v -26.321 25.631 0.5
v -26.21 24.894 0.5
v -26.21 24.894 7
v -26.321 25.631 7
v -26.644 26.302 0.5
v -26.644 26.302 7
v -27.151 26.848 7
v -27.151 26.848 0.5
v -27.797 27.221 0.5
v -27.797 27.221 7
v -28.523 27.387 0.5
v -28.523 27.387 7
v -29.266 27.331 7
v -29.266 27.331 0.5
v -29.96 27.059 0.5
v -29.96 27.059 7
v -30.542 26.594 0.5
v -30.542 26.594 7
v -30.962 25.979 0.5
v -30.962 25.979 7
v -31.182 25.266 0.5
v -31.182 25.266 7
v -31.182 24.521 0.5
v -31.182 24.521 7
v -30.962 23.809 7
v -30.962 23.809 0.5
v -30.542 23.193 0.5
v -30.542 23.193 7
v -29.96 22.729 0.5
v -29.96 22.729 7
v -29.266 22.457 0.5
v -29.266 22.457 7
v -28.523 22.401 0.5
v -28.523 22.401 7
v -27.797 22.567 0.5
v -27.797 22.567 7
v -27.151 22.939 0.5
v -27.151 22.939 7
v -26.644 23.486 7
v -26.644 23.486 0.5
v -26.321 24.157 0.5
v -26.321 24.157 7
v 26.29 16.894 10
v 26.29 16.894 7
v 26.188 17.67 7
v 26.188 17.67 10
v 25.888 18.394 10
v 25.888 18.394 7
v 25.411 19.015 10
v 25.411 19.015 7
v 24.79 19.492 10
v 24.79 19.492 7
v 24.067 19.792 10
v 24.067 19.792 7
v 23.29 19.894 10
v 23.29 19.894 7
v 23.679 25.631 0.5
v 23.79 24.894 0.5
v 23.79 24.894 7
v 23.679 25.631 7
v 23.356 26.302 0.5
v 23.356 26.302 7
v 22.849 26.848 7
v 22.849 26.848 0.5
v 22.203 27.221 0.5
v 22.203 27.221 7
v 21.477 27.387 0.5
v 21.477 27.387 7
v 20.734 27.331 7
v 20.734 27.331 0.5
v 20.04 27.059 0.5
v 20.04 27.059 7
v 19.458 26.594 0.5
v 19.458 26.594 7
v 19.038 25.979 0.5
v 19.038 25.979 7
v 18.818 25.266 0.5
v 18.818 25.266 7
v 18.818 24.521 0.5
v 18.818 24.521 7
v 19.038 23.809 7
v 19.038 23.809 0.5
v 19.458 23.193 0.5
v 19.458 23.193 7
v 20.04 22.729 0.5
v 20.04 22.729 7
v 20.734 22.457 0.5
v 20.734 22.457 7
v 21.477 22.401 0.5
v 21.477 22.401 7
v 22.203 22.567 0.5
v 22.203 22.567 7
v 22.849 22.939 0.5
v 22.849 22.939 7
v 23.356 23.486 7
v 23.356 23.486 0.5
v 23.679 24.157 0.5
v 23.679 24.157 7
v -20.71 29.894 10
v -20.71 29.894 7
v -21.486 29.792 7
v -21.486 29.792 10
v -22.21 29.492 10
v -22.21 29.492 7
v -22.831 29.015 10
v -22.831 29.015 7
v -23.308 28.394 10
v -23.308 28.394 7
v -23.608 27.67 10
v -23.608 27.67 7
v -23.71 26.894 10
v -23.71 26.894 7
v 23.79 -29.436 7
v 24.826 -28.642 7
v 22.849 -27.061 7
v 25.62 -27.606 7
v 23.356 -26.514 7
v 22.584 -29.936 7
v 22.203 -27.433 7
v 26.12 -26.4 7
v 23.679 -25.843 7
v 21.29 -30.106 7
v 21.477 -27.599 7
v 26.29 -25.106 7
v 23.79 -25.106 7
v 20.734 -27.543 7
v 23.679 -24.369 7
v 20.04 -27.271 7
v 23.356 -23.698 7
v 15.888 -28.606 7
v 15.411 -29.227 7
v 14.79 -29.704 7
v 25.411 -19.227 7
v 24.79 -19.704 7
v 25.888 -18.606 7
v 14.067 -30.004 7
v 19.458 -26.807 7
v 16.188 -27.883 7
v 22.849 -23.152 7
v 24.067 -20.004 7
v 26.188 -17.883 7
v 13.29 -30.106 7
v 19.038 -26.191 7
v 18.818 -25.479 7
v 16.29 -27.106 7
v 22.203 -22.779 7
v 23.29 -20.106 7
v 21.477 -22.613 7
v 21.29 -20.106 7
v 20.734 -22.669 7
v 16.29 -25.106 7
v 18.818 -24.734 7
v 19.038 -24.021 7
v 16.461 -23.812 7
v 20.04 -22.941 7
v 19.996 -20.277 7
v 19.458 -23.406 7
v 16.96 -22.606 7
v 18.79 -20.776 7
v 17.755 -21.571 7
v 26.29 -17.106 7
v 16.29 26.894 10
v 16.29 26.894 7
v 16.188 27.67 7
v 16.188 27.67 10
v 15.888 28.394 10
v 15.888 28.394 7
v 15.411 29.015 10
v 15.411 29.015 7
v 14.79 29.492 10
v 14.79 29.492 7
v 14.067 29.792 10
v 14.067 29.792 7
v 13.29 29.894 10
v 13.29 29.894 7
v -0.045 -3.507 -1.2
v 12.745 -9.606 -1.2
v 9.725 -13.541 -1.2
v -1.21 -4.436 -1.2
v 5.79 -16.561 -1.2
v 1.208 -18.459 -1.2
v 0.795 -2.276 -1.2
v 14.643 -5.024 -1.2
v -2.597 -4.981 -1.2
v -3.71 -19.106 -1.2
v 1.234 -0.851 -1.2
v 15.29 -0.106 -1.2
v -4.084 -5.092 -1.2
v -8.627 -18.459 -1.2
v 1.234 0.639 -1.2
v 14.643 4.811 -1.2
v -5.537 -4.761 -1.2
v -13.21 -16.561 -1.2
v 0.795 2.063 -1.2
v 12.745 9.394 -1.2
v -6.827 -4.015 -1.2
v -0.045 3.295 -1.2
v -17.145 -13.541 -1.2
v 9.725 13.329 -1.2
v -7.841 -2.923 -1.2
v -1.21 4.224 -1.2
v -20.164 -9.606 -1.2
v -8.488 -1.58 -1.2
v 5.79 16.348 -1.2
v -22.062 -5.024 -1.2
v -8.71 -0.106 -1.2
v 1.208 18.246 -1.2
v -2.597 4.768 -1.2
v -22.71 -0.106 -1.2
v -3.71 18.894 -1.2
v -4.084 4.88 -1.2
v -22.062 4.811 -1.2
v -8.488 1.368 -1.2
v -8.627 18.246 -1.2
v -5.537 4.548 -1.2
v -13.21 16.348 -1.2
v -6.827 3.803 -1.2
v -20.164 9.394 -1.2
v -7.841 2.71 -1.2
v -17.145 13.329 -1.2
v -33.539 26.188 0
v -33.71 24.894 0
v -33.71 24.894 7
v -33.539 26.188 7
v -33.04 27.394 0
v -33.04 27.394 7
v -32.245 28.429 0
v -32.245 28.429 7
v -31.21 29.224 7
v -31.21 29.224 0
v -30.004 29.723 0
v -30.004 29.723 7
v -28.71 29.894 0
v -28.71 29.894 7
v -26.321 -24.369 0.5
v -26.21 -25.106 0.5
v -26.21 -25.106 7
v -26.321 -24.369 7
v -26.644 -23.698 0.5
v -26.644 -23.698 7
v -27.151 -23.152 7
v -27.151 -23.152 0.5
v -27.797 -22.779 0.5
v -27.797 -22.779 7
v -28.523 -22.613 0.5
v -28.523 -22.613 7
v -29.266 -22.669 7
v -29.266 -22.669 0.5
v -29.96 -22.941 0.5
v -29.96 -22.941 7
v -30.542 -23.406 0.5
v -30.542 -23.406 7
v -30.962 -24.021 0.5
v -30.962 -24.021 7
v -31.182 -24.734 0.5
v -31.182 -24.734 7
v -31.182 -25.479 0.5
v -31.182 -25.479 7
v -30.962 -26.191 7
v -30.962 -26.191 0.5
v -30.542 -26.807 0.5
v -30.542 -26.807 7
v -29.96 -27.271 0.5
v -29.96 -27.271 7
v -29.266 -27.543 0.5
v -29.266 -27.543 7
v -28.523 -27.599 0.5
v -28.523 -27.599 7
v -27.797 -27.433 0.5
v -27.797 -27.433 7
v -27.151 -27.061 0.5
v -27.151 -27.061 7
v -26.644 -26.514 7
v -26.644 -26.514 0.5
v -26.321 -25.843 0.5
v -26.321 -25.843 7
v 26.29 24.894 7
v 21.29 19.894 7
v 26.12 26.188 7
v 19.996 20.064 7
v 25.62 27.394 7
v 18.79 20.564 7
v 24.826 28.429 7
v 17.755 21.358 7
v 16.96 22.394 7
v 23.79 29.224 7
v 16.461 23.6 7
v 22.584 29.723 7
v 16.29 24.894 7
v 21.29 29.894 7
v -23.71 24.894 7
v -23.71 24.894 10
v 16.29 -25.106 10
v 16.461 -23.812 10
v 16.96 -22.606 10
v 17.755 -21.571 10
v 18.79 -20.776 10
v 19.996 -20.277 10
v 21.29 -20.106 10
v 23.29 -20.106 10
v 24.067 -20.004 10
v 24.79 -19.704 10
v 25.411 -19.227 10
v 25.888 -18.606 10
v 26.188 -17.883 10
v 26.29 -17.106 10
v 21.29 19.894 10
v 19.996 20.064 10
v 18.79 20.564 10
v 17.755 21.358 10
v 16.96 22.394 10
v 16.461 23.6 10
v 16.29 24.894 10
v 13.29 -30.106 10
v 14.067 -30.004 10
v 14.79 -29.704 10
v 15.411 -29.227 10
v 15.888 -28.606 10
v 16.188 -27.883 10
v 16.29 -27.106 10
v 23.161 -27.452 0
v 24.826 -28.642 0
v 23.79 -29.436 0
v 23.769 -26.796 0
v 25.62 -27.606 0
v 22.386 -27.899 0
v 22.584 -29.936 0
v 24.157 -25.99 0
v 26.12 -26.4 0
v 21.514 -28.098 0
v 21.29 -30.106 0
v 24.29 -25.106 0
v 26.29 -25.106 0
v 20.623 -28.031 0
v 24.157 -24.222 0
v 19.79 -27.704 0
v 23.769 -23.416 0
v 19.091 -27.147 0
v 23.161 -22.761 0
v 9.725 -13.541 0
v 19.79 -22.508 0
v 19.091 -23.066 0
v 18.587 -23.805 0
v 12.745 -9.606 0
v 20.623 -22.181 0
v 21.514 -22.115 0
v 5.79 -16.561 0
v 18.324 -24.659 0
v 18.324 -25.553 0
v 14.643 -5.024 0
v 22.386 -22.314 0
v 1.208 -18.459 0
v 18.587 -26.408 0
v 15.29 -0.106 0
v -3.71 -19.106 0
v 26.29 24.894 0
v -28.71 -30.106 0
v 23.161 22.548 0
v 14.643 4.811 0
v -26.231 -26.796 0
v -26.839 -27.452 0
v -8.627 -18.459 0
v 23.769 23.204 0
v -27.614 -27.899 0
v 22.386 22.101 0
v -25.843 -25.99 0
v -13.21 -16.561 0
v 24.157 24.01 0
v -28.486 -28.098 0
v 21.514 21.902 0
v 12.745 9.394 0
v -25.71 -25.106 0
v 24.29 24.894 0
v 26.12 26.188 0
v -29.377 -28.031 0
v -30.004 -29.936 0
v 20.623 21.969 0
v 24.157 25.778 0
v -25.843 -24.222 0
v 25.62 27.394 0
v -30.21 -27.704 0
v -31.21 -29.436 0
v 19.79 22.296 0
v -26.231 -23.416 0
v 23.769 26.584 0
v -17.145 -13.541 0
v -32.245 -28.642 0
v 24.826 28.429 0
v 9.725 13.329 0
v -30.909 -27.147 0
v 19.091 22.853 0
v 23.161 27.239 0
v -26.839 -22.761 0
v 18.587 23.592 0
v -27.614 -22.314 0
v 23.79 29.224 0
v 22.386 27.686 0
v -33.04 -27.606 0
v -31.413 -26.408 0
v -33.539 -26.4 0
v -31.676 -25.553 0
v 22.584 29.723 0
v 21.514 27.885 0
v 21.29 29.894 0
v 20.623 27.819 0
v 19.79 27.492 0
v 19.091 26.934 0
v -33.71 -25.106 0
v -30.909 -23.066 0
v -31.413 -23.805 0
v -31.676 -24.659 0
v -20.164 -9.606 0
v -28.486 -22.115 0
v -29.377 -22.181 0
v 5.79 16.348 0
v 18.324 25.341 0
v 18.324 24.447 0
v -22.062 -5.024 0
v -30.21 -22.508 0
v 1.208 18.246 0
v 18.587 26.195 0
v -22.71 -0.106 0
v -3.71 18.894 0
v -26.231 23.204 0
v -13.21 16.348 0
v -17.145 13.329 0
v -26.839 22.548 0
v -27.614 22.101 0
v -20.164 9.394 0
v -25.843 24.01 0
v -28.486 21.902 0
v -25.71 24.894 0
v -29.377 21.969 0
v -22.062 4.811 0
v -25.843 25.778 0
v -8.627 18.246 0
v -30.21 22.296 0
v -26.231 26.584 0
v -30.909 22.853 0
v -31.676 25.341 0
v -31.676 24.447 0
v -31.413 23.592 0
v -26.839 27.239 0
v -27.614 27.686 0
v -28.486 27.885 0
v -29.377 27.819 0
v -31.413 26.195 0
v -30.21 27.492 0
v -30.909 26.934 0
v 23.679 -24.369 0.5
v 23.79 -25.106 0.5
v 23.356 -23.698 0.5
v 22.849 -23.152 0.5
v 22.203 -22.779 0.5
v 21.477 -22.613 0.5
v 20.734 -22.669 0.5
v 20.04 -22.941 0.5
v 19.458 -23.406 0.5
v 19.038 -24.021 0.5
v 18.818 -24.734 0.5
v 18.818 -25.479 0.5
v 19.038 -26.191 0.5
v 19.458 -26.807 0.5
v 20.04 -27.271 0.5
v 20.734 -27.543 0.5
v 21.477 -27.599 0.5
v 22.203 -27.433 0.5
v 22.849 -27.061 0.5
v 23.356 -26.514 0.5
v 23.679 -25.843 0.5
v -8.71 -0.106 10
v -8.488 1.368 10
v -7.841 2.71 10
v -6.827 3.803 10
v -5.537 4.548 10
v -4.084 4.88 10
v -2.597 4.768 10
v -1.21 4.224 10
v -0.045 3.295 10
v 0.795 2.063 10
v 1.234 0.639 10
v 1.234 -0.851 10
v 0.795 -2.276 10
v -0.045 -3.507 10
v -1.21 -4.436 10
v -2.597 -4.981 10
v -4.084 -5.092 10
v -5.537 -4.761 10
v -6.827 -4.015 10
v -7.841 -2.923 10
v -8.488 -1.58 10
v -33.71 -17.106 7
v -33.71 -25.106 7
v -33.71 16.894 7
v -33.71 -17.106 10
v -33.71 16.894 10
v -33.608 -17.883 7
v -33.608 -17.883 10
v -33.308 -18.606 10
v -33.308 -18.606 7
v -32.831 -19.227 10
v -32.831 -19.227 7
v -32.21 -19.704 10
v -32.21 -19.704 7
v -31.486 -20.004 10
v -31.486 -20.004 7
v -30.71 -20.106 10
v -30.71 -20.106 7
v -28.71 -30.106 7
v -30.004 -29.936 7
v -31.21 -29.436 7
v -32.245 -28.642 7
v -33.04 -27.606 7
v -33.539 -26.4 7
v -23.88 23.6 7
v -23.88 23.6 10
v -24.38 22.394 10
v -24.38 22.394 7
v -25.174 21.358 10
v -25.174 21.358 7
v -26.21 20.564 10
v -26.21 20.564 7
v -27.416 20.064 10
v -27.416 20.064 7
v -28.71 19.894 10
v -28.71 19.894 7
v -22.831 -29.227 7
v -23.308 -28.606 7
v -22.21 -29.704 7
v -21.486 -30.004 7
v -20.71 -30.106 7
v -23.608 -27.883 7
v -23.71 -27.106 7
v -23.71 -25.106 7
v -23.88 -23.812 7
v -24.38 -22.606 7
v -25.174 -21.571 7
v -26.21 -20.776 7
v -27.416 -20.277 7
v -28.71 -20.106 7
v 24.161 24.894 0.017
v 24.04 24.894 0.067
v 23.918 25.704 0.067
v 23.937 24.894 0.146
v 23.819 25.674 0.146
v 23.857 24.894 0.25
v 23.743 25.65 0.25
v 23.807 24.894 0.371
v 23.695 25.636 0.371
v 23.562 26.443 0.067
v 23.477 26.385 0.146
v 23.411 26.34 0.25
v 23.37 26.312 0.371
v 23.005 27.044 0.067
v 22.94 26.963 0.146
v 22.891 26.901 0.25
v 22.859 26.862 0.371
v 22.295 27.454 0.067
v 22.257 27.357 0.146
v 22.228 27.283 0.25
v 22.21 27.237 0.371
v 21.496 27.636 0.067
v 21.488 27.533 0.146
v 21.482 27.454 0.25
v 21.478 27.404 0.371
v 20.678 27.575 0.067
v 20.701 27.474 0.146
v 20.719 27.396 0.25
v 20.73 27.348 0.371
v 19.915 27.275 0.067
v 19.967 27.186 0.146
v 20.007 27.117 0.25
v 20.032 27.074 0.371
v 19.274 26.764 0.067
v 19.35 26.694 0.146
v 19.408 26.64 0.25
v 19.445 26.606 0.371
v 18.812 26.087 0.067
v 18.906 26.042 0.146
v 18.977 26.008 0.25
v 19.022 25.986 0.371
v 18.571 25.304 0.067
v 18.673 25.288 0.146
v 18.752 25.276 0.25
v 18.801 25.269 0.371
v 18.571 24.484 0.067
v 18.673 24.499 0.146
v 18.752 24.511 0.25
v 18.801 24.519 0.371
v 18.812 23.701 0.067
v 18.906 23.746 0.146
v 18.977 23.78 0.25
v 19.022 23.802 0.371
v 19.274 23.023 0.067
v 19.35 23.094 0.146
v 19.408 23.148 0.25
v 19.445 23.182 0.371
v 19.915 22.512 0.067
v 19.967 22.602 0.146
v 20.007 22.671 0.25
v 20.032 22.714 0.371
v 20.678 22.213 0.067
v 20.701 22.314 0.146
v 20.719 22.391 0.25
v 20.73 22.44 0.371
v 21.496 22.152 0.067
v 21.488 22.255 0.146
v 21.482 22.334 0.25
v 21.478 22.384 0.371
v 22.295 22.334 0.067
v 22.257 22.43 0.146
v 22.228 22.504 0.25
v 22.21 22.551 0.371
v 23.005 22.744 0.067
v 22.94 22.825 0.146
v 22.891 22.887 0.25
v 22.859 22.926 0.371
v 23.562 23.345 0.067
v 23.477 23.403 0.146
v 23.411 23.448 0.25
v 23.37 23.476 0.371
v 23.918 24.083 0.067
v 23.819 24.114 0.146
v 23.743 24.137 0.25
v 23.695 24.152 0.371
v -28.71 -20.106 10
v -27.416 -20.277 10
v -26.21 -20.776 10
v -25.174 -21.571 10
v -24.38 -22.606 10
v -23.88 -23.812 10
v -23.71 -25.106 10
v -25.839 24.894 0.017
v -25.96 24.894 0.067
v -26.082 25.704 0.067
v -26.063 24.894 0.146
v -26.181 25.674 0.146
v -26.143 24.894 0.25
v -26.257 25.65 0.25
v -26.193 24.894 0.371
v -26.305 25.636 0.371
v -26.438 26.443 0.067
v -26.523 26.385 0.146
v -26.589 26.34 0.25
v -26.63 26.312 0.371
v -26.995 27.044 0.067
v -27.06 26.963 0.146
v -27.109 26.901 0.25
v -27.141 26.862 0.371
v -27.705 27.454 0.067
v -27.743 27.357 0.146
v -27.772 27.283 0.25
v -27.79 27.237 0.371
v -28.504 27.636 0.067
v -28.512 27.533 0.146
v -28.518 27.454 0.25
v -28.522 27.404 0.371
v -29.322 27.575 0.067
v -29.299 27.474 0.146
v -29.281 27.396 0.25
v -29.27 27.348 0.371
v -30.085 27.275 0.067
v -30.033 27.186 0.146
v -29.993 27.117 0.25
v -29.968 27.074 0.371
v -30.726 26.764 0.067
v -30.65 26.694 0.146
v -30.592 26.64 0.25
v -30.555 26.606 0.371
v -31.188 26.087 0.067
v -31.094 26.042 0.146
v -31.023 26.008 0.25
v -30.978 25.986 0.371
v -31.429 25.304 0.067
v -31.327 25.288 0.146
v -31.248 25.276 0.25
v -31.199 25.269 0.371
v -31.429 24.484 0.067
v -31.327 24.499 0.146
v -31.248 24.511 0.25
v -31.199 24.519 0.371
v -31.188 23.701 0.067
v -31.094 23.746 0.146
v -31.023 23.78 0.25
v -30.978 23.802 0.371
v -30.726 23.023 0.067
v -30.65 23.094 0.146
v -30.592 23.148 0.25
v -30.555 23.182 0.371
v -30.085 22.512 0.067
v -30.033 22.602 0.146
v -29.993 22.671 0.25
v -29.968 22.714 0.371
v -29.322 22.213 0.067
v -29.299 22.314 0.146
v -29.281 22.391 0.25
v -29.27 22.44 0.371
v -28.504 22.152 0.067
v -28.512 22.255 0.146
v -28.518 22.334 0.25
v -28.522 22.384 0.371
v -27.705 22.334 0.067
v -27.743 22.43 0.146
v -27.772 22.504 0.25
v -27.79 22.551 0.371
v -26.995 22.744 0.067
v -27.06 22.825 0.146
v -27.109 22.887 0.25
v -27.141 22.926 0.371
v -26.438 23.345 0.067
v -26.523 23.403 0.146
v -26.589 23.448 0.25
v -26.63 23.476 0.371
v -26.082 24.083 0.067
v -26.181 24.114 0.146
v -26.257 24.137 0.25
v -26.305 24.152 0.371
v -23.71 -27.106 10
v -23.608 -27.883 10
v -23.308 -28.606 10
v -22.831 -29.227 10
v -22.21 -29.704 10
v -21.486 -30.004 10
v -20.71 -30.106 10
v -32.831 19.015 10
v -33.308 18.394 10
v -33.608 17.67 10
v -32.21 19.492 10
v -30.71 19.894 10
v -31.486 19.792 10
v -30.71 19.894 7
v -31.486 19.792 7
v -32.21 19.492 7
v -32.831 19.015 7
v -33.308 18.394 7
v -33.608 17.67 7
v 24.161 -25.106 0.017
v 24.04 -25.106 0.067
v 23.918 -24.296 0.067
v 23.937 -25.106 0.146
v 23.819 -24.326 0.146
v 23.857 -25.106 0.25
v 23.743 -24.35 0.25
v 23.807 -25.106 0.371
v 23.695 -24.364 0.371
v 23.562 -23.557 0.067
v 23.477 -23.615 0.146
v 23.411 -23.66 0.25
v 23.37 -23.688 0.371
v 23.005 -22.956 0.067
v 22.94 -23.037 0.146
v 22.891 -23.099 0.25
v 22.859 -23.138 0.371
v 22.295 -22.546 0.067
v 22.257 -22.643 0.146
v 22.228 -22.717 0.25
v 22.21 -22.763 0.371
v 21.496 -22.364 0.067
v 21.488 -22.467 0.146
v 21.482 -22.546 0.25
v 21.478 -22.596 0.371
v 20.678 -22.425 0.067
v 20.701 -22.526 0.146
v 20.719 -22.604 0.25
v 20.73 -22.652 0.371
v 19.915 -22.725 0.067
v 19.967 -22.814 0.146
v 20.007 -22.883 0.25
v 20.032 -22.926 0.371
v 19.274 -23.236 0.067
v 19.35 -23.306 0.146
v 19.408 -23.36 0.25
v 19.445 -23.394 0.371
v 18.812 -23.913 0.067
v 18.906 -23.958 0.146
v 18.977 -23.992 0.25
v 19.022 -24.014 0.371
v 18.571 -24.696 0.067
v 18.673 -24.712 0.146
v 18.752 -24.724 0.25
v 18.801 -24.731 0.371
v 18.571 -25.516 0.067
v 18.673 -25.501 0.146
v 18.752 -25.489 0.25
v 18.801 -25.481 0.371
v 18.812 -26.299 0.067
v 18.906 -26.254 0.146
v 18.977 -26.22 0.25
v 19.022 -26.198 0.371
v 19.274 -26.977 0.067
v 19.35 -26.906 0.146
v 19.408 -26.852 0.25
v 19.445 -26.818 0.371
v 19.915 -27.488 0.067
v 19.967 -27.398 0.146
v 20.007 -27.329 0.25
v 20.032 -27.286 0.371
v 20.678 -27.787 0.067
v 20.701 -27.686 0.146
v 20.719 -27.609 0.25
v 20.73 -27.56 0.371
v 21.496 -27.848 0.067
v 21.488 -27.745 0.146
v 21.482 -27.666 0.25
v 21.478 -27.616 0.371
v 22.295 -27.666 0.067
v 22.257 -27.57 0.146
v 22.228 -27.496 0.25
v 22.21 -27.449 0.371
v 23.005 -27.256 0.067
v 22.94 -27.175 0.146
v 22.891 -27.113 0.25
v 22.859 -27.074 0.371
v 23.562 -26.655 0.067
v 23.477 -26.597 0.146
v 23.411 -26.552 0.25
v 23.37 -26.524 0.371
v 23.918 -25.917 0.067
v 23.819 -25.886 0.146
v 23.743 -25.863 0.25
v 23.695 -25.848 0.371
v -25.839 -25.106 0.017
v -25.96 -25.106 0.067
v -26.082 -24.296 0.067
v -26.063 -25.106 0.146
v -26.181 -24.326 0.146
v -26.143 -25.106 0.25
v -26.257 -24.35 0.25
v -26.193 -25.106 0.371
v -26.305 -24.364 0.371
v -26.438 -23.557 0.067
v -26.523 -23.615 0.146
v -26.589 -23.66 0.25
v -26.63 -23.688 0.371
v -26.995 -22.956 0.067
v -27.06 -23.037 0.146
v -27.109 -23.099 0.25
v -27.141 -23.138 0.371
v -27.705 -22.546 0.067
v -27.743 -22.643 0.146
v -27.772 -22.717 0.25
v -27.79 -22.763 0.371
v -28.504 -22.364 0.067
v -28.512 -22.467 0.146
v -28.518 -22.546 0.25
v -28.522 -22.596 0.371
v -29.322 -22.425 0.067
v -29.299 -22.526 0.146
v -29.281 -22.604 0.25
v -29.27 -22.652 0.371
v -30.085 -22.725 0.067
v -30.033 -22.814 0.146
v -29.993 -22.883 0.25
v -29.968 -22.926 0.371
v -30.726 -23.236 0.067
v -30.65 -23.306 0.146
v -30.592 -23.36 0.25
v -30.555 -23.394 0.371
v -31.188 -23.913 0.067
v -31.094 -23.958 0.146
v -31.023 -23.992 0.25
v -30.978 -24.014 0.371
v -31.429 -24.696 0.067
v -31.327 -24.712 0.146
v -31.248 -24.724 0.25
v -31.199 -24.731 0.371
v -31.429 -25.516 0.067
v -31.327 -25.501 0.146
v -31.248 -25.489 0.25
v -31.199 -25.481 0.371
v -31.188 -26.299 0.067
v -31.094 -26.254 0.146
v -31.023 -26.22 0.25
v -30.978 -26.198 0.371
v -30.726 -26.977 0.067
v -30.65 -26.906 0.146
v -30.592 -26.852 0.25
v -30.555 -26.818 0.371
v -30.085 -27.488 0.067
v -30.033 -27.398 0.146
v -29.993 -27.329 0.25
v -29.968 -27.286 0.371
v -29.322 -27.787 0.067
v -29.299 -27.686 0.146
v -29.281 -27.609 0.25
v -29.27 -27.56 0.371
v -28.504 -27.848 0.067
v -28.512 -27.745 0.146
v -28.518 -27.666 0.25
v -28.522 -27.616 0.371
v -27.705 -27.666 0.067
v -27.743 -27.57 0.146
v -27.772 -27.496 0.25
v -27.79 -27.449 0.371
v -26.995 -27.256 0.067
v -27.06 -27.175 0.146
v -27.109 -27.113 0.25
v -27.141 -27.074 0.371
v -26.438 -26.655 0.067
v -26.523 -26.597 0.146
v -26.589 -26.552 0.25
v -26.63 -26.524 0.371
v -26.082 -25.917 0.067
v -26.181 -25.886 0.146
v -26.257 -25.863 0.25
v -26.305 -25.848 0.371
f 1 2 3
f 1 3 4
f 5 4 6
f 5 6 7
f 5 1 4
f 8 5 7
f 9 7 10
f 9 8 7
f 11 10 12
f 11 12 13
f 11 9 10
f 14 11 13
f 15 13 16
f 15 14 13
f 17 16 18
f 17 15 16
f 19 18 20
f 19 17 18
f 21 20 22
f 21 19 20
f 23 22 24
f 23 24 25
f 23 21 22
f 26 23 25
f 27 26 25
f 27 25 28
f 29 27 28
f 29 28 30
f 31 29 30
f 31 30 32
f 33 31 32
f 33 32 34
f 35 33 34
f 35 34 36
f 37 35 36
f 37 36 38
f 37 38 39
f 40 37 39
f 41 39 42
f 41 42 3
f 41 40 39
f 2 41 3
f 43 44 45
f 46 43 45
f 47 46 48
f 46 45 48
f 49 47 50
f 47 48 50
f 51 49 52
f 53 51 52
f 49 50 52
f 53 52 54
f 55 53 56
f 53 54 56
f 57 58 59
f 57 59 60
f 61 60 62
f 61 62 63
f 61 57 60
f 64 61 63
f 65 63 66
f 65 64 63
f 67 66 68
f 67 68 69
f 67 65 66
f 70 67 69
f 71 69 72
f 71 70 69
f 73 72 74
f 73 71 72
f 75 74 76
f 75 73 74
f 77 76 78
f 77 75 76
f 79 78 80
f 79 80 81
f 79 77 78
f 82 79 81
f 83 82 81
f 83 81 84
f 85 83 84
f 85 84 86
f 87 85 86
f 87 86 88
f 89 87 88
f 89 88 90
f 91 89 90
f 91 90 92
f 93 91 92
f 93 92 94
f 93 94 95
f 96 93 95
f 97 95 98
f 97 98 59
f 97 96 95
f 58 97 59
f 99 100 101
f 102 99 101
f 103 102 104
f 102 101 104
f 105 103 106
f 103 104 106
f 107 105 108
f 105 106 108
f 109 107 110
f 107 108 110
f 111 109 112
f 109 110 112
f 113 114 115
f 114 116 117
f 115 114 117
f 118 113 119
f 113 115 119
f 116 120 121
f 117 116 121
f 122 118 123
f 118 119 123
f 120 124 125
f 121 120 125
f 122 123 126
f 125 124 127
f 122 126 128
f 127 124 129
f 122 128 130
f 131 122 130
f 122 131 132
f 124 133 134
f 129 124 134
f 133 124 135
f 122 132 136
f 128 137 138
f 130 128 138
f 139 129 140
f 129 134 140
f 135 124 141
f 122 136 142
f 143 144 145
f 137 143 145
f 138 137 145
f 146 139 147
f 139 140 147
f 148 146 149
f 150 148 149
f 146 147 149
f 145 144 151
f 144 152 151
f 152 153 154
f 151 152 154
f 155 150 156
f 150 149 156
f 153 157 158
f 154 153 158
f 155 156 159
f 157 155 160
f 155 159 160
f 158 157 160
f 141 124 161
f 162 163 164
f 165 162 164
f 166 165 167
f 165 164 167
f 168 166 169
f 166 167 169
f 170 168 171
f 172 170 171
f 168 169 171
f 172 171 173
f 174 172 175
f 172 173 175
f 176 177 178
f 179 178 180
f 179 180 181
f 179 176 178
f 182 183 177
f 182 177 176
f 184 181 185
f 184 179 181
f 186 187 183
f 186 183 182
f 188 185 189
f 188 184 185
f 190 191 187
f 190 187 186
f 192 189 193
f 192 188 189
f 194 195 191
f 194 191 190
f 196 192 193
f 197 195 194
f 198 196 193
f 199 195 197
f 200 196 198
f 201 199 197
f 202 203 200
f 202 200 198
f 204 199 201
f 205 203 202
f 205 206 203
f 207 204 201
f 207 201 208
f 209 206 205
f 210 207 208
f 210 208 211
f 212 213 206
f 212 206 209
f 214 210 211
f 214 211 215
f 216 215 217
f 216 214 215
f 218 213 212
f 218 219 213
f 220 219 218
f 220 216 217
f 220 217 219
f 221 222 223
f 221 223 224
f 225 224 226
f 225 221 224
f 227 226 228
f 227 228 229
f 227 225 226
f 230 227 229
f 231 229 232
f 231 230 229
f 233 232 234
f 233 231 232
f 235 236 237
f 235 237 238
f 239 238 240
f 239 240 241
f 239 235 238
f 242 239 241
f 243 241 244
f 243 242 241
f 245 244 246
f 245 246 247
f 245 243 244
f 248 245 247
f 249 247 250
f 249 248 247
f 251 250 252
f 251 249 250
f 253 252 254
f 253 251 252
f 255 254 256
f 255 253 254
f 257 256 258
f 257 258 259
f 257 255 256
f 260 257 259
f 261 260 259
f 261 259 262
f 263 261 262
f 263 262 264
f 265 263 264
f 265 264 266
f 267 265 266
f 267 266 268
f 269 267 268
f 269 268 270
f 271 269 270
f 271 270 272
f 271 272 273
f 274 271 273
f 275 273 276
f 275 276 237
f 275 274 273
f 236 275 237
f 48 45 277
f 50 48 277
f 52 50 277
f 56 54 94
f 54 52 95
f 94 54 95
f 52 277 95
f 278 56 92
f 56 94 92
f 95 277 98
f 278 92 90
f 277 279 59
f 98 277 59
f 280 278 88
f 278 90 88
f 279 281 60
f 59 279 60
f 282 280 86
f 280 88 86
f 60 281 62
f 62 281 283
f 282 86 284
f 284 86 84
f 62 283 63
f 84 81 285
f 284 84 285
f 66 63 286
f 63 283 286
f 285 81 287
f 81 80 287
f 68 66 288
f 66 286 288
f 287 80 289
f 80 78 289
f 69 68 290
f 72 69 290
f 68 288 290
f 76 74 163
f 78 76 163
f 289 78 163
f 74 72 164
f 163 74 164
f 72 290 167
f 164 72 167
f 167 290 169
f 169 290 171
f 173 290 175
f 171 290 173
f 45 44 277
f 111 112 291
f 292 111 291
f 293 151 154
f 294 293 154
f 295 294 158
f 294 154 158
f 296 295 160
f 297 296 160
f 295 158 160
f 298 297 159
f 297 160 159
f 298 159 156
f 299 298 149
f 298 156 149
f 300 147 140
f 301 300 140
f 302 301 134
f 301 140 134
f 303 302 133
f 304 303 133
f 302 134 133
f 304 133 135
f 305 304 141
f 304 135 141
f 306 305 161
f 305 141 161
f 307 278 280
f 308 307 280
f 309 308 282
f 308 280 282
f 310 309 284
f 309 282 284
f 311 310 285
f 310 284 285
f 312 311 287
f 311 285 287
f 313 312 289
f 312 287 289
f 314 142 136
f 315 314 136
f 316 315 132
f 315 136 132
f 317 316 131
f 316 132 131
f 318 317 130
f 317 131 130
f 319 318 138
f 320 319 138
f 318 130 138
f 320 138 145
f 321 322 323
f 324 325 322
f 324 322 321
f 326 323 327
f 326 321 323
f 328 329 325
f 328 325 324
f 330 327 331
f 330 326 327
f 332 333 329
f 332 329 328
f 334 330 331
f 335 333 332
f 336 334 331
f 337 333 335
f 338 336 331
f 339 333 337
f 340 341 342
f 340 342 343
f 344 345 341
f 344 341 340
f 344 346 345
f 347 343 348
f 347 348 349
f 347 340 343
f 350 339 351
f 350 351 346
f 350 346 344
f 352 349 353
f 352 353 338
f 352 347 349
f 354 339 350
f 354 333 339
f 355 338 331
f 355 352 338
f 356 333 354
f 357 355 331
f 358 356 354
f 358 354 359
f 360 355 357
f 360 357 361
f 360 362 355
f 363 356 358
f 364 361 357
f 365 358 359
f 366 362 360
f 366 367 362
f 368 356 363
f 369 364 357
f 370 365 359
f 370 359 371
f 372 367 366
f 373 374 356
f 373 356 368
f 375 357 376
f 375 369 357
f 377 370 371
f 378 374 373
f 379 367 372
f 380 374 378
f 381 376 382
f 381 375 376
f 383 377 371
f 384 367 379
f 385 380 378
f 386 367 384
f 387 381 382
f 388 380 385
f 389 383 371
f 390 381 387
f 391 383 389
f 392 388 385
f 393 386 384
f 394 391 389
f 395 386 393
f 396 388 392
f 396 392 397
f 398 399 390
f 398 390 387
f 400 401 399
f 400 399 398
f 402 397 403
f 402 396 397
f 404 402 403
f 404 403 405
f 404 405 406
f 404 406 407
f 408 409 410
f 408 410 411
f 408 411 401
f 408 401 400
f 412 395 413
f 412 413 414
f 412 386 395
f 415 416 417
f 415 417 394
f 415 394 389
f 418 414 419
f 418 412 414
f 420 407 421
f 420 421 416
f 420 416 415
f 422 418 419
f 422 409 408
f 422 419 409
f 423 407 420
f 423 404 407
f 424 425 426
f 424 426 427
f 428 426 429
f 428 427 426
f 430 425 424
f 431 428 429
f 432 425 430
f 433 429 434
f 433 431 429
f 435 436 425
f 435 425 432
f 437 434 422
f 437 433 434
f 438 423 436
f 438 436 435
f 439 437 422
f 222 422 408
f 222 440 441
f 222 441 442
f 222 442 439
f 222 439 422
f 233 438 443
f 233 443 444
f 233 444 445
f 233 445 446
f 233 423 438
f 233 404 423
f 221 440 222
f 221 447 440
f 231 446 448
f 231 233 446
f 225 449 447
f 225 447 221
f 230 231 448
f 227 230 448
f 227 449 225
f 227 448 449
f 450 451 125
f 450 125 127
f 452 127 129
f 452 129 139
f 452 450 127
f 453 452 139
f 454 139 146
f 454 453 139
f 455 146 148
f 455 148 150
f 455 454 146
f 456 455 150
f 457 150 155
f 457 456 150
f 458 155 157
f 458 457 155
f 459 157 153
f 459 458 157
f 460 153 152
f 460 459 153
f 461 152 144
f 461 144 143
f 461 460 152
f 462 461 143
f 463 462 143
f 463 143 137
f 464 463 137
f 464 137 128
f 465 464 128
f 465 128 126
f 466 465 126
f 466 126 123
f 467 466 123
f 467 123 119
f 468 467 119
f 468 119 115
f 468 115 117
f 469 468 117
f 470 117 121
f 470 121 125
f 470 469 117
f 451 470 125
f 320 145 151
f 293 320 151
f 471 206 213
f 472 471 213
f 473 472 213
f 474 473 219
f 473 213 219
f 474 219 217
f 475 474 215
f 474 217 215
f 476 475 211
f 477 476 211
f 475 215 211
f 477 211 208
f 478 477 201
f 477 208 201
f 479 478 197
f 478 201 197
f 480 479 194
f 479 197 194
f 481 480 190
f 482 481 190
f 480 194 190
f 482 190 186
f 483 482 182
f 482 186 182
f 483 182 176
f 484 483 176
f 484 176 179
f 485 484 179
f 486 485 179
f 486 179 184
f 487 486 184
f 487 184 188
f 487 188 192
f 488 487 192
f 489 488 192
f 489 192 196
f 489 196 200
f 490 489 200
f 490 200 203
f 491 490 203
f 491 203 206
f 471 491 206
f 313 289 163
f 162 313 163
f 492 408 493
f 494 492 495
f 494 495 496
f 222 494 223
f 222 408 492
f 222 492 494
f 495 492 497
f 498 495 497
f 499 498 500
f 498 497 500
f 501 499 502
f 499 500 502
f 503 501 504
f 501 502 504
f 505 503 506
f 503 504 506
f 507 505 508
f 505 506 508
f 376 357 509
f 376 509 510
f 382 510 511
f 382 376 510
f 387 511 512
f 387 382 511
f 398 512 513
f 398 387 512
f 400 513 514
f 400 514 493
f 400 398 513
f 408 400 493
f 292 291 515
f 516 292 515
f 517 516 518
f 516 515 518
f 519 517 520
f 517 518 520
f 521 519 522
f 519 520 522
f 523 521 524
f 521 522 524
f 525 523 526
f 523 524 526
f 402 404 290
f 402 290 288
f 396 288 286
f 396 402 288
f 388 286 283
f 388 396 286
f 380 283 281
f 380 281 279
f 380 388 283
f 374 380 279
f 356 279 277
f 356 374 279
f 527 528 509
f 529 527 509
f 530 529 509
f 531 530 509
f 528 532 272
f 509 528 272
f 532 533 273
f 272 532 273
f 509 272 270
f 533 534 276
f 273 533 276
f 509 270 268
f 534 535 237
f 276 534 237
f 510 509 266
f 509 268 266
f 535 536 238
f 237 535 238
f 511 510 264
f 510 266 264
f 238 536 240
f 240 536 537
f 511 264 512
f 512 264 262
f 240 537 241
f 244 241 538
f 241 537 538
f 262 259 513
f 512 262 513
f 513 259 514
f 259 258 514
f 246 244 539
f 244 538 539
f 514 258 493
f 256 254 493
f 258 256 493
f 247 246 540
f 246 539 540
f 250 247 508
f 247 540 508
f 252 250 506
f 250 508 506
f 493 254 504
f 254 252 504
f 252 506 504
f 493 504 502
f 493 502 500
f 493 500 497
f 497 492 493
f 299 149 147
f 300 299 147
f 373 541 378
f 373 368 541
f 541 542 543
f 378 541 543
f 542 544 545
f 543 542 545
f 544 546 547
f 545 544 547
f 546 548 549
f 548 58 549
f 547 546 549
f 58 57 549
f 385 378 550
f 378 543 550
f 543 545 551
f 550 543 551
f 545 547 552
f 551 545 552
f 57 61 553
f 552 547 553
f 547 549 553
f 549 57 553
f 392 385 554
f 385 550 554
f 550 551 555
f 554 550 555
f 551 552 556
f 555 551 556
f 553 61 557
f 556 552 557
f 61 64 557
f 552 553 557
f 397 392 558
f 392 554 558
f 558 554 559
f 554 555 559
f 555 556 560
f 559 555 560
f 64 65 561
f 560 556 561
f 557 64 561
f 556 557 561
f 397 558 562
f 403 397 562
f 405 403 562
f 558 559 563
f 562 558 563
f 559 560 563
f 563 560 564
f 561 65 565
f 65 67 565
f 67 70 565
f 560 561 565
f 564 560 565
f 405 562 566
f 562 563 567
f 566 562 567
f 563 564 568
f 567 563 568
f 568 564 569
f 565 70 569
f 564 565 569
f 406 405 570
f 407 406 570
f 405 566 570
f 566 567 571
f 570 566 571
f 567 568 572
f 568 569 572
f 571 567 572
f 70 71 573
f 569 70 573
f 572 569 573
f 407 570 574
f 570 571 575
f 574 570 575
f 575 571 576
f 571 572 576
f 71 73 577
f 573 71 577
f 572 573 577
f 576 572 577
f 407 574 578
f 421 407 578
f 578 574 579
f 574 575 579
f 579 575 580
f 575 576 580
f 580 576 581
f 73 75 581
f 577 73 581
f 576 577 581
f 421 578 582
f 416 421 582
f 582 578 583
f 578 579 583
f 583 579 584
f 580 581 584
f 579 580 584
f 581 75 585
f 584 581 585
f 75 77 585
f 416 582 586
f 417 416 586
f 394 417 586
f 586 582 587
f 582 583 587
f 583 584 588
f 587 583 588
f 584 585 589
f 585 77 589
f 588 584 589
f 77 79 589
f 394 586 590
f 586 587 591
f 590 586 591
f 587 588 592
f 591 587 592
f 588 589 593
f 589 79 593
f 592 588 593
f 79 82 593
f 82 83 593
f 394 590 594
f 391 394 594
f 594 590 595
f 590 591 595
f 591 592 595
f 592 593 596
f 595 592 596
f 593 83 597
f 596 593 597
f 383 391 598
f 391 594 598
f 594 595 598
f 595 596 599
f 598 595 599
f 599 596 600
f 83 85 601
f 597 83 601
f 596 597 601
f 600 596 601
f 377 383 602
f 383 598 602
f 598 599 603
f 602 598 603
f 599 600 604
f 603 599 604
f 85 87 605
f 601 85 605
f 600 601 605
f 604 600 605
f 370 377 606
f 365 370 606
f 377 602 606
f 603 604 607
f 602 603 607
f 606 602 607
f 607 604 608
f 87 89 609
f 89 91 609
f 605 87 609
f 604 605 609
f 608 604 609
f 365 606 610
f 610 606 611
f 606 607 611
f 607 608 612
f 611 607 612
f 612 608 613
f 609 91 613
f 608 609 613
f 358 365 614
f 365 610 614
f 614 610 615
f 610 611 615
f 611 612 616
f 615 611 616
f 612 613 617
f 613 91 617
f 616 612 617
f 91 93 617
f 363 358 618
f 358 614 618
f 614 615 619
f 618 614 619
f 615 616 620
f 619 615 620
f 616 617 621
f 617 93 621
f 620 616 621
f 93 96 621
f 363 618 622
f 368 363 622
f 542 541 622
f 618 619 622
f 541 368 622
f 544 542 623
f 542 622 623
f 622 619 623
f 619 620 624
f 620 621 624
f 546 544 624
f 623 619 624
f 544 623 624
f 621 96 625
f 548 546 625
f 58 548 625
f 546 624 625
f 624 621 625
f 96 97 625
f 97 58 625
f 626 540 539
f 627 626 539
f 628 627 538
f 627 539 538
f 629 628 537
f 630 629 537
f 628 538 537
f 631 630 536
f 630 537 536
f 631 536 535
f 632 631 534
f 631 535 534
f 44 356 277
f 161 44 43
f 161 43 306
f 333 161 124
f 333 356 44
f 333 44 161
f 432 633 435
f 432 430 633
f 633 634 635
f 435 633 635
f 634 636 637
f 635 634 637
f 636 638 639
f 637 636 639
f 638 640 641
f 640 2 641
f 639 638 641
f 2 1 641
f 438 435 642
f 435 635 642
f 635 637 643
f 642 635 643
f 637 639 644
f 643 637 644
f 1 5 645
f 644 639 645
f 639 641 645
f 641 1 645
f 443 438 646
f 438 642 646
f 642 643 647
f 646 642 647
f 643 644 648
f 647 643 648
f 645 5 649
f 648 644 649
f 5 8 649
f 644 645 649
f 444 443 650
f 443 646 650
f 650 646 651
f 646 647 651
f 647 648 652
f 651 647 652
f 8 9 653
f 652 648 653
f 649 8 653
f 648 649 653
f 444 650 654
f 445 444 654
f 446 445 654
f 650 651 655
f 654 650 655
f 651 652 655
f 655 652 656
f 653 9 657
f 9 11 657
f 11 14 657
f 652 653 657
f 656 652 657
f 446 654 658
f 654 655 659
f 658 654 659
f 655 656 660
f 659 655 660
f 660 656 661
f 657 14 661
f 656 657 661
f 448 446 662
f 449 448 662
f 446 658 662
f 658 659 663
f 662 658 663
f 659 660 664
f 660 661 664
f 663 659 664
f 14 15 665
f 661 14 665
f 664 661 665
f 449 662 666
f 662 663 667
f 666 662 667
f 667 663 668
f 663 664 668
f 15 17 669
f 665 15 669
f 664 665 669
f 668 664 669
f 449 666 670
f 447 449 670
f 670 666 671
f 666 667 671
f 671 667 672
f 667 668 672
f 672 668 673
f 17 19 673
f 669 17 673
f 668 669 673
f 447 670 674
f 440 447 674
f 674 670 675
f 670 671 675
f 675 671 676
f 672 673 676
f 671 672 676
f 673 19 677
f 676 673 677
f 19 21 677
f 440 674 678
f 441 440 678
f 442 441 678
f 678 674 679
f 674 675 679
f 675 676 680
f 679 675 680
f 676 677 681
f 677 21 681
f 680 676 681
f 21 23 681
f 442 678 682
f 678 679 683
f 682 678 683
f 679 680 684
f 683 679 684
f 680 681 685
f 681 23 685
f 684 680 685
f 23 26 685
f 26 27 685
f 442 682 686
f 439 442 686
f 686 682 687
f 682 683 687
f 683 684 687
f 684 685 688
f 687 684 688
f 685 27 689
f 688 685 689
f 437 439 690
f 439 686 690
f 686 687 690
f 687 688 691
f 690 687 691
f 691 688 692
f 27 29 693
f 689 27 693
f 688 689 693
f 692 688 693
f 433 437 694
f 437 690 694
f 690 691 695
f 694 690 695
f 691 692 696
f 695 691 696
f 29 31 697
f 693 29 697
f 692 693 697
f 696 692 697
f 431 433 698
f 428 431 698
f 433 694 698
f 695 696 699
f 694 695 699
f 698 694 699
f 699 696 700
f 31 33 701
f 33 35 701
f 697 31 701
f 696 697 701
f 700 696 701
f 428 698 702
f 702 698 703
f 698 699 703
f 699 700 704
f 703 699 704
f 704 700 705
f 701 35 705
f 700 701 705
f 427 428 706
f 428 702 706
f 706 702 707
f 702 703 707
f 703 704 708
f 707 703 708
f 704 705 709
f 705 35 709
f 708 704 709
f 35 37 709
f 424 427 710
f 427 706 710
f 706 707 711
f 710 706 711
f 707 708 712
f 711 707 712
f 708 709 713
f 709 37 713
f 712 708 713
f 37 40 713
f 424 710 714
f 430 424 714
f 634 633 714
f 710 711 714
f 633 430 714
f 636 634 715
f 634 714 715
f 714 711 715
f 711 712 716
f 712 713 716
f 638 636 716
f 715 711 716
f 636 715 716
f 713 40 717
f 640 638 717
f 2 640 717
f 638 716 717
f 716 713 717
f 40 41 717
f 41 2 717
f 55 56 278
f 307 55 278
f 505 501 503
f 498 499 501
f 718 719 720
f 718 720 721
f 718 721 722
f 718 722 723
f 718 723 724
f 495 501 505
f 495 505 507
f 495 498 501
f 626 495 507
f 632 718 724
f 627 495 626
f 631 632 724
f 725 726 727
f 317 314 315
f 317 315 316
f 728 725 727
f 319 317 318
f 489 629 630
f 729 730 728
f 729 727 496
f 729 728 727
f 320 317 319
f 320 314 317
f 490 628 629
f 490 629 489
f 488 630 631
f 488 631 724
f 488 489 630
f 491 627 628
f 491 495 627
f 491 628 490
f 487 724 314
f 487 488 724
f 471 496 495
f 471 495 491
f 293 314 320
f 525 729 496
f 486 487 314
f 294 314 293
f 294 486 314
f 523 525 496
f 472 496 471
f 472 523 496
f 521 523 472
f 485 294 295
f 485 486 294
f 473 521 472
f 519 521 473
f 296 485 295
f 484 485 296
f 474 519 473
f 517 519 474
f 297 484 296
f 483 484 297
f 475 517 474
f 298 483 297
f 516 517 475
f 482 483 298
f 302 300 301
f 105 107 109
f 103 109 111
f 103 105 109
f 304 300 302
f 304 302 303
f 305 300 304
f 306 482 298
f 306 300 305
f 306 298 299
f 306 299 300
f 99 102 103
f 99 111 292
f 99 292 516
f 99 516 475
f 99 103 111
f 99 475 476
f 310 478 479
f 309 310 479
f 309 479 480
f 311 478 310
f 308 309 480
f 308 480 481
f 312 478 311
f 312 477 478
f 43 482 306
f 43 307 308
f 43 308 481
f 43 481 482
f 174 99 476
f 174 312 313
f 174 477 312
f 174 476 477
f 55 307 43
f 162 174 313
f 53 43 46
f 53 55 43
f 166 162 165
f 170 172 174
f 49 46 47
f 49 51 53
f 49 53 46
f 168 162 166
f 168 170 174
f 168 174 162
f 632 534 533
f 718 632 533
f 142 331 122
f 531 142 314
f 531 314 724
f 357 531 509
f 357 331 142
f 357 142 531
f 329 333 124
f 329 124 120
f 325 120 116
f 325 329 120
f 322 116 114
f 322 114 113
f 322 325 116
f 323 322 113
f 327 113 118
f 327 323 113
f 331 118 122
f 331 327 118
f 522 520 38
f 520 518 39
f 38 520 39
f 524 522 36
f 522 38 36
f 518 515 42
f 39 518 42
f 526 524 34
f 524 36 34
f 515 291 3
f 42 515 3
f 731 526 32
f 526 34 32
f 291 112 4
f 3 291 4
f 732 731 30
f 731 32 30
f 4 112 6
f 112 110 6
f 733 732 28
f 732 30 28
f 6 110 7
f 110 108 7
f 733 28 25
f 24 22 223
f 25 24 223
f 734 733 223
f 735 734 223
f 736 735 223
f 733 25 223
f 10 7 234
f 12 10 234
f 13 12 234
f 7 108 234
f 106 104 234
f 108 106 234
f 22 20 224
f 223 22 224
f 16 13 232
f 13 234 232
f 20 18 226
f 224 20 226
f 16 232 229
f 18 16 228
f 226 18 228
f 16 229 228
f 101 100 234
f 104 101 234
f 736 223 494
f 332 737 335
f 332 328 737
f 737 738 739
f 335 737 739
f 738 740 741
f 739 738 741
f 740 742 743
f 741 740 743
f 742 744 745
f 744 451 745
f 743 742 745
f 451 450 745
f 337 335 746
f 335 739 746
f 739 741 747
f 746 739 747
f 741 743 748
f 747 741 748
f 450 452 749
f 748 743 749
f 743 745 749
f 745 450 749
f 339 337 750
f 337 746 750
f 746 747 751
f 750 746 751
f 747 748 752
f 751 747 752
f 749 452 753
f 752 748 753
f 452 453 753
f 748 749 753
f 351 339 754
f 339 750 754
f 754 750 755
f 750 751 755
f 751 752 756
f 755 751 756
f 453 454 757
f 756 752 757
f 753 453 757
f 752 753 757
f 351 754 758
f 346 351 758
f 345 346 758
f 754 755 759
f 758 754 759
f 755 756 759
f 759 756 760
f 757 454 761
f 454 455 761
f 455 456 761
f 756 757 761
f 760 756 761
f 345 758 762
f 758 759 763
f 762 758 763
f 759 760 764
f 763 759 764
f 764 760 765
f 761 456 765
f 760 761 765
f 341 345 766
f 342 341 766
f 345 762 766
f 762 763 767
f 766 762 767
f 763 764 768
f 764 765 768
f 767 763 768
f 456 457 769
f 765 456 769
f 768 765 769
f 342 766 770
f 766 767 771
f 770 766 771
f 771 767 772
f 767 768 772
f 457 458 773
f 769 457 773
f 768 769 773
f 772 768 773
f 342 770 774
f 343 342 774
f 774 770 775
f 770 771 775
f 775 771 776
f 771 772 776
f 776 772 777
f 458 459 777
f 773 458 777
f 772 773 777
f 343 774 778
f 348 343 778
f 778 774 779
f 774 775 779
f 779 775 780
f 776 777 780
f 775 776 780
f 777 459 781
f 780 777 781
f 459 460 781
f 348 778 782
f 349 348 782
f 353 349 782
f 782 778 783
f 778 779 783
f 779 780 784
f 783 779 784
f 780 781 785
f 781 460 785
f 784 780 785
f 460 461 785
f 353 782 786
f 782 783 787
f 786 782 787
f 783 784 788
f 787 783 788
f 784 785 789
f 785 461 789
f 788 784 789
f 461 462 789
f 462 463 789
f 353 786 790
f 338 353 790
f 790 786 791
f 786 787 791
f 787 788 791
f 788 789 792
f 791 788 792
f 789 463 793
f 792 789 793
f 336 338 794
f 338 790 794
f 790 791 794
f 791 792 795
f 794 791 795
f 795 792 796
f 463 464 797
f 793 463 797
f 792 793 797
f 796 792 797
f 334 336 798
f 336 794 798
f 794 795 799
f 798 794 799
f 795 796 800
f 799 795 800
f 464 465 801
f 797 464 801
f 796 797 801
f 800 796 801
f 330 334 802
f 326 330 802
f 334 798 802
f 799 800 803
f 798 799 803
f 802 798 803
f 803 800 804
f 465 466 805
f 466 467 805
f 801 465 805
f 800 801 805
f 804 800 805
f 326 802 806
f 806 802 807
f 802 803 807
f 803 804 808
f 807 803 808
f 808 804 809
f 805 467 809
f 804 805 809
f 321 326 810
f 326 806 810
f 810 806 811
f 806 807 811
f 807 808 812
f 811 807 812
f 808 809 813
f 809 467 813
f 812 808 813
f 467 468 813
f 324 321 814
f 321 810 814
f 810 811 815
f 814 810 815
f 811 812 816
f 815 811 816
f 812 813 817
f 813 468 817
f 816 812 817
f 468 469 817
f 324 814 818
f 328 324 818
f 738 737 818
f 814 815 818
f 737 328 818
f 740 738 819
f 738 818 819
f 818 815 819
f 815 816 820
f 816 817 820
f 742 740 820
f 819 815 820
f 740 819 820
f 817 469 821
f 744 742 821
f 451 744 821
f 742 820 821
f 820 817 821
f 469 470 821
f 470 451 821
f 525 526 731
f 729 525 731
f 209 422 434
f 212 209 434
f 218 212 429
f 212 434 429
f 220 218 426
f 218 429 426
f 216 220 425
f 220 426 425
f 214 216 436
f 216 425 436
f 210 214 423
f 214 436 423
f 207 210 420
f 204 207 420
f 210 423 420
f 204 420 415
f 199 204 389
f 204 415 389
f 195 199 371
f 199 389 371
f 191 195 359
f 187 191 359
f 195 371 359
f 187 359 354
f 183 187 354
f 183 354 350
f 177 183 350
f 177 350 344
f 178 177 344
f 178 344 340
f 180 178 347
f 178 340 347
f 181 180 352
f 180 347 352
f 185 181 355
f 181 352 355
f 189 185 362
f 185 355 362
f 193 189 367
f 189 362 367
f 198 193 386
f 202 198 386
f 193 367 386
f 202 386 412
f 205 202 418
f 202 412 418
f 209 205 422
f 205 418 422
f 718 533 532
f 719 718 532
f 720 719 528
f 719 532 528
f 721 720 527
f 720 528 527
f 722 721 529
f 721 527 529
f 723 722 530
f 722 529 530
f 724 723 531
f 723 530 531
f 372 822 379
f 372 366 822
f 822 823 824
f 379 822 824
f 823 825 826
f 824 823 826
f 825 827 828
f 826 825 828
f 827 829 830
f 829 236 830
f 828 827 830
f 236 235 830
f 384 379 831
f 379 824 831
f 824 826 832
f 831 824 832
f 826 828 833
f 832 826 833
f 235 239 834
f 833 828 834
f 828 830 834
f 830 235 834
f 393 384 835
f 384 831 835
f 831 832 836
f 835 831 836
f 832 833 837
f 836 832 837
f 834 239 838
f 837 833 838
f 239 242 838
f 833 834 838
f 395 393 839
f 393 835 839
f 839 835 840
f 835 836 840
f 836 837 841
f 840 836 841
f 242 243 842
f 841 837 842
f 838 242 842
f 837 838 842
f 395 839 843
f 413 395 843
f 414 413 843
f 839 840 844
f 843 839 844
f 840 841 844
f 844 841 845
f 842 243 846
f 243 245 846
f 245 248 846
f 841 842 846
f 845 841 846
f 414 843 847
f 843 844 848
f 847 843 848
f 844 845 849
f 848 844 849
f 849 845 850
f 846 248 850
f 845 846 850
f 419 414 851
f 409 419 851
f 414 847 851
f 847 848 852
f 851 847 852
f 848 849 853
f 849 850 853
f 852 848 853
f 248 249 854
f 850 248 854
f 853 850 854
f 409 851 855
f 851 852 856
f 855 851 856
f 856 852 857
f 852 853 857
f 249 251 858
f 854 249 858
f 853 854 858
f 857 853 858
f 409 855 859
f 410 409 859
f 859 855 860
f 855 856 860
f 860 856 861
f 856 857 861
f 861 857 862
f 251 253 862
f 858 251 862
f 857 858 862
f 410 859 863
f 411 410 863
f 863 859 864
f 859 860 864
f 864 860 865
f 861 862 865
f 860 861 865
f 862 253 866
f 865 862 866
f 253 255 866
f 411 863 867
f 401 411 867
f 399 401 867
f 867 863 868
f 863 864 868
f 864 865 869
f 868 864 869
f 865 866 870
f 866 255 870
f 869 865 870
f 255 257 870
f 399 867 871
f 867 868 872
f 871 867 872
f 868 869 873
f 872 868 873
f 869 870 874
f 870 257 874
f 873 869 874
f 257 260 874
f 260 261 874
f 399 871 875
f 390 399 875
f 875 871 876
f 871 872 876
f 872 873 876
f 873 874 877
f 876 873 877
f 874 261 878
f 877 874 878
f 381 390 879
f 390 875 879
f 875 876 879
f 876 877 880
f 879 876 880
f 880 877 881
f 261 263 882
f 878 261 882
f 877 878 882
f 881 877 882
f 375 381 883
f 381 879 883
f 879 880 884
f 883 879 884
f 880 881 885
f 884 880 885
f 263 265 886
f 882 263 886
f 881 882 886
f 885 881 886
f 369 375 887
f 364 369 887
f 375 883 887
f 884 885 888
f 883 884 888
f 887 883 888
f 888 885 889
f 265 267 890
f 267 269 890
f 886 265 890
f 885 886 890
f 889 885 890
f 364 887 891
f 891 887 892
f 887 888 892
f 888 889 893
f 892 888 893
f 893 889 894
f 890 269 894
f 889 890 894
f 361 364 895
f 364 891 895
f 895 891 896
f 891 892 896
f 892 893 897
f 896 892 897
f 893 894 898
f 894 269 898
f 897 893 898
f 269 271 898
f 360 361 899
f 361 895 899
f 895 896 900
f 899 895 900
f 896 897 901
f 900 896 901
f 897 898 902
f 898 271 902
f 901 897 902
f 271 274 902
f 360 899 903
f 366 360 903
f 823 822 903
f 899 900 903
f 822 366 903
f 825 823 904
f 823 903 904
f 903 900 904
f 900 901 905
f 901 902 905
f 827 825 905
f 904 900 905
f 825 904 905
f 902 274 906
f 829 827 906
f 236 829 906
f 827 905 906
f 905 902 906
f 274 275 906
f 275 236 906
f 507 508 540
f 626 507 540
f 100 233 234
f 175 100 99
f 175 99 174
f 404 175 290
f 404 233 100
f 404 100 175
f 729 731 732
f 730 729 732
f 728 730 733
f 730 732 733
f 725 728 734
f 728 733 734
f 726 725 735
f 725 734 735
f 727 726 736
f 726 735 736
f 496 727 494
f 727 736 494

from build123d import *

# Parameters (mm, degrees)
IZIM1_R                     = 2.5
Y_KSEKLIK_EKSTR_ZYON1_DEPTH = 7
Y_KSEKLIK_EKSTR_ZYON2_DEPTH = 3
IZIM4_R                     = 19
Y_KSEKLIK_EKSTR_ZYON4_DEPTH = 1.2
RADYUS1_R                   = 0.5
IZIM6_R                     = 5
KES_EKSTR_ZYON2_DEPTH       = 12.2


with BuildPart() as part:
    # Çizim1 → Yükseklik-Ekstrüzyon1 (new body)
    with BuildSketch(Plane.XY):
        with BuildLine():
            Line((-28.709869289, 29.893846154), (21.290130711, 29.893846154))
            ThreePointArc((21.290130711, 29.893846154), (24.825664617, 28.42938006), (26.290130711, 24.893846154))
            Line((26.290130711, 24.893846154), (26.290130711, -25.106153846))
            ThreePointArc((26.290130711, -25.106153846), (24.825664617, -28.641687752), (21.290130711, -30.106153846))
            Line((21.290130711, -30.106153846), (-28.709869289, -30.106153846))
            ThreePointArc((-28.709869289, -30.106153846), (-32.245403195, -28.641687752), (-33.709869289, -25.106153846))
            Line((-33.709869289, -25.106153846), (-33.709869289, 24.893846154))
            ThreePointArc((-33.709869289, 24.893846154), (-32.245403195, 28.42938006), (-28.709869289, 29.893846154))
        make_face()
        with Locations((-28.709869289, 24.893846154)):
            Circle(IZIM1_R, mode=Mode.SUBTRACT)
        with Locations((21.290130711, 24.893846154)):
            Circle(IZIM1_R, mode=Mode.SUBTRACT)
        with Locations((21.290130711, -25.106153846)):
            Circle(IZIM1_R, mode=Mode.SUBTRACT)
        with Locations((-28.709869289, -25.106153846)):
            Circle(IZIM1_R, mode=Mode.SUBTRACT)
    extrude(amount=Y_KSEKLIK_EKSTR_ZYON1_DEPTH)

    # Çizim2 → Yükseklik-Ekstrüzyon2 (add)
    with BuildSketch(Plane.XY.offset(7)):
        with BuildLine():
            Line((13.290130711, 29.893846154), (-20.709869289, 29.893846154))
            ThreePointArc((-20.709869289, 29.893846154), (-22.831189632, 29.015166497), (-23.709869289, 26.893846154))
            Line((-23.709869289, 26.893846154), (-23.709869289, 24.893846154))
            ThreePointArc((-23.709869289, 24.893846154), (-25.174335383, 21.358312248), (-28.709869289, 19.893846154))
            Line((-28.709869289, 19.893846154), (-30.709869289, 19.893846154))
            ThreePointArc((-30.709869289, 19.893846154), (-32.831189632, 19.015166497), (-33.709869289, 16.893846154))
            Line((-33.709869289, 16.893846154), (-33.709869289, -17.106153846))
            ThreePointArc((-33.709869289, -17.106153846), (-32.831189632, -19.22747419), (-30.709869289, -20.106153846))
            Line((-30.709869289, -20.106153846), (-28.709869289, -20.106153846))
            ThreePointArc((-28.709869289, -20.106153846), (-25.174335383, -21.57061994), (-23.709869289, -25.106153846))
            Line((-23.709869289, -25.106153846), (-23.709869289, -27.106153846))
            ThreePointArc((-23.709869289, -27.106153846), (-22.831189632, -29.22747419), (-20.709869289, -30.106153846))
            Line((-20.709869289, -30.106153846), (13.290130711, -30.106153846))
            ThreePointArc((13.290130711, -30.106153846), (15.411451055, -29.22747419), (16.290130711, -27.106153846))
            Line((16.290130711, -27.106153846), (16.290130711, -25.106153846))
            ThreePointArc((16.290130711, -25.106153846), (17.754596805, -21.57061994), (21.290130711, -20.106153846))
            Line((21.290130711, -20.106153846), (23.290130711, -20.106153846))
            ThreePointArc((23.290130711, -20.106153846), (25.411451055, -19.22747419), (26.290130711, -17.106153846))
            Line((26.290130711, -17.106153846), (26.290130711, 16.893846154))
            ThreePointArc((26.290130711, 16.893846154), (25.411451055, 19.015166497), (23.290130711, 19.893846154))
            Line((23.290130711, 19.893846154), (21.290130711, 19.893846154))
            ThreePointArc((21.290130711, 19.893846154), (17.754596805, 21.358312248), (16.290130711, 24.893846154))
            Line((16.290130711, 24.893846154), (16.290130711, 26.893846154))
            ThreePointArc((16.290130711, 26.893846154), (15.411451055, 29.015166497), (13.290130711, 29.893846154))
        make_face()
    extrude(amount=Y_KSEKLIK_EKSTR_ZYON2_DEPTH)

    # Çizim4 → Yükseklik-Ekstrüzyon4 (add)
    with BuildSketch(Plane(origin=(0, 0, 0), x_dir=(-1, 0, 0), z_dir=(0, 0, -1))):
        with Locations((3.709869289, -0.106153846)):
            Circle(IZIM4_R)
    extrude(amount=Y_KSEKLIK_EKSTR_ZYON4_DEPTH)

    # Radyus1
    radyus1_edges = [part.edges().sort_by_distance(p)[0] for p in [
        (-31.209869289, 24.893846154, 0),
        (18.790130711, 24.893846154, 0),
        (18.790130711, -25.106153846, 0),
        (-31.209869289, -25.106153846, 0),
    ]]
    fillet(radyus1_edges, radius=RADYUS1_R)

    # Çizim6 → Kes-Ekstrüzyon2 (cut, through all)
    with BuildSketch(Plane(origin=(0, 0, -1.2), x_dir=(-1, 0, 0), z_dir=(0, 0, -1))):
        with Locations((3.709869289, -0.106153846)):
            Circle(IZIM6_R)
    extrude(amount=-KES_EKSTR_ZYON2_DEPTH, mode=Mode.SUBTRACT)


solid = part.part
